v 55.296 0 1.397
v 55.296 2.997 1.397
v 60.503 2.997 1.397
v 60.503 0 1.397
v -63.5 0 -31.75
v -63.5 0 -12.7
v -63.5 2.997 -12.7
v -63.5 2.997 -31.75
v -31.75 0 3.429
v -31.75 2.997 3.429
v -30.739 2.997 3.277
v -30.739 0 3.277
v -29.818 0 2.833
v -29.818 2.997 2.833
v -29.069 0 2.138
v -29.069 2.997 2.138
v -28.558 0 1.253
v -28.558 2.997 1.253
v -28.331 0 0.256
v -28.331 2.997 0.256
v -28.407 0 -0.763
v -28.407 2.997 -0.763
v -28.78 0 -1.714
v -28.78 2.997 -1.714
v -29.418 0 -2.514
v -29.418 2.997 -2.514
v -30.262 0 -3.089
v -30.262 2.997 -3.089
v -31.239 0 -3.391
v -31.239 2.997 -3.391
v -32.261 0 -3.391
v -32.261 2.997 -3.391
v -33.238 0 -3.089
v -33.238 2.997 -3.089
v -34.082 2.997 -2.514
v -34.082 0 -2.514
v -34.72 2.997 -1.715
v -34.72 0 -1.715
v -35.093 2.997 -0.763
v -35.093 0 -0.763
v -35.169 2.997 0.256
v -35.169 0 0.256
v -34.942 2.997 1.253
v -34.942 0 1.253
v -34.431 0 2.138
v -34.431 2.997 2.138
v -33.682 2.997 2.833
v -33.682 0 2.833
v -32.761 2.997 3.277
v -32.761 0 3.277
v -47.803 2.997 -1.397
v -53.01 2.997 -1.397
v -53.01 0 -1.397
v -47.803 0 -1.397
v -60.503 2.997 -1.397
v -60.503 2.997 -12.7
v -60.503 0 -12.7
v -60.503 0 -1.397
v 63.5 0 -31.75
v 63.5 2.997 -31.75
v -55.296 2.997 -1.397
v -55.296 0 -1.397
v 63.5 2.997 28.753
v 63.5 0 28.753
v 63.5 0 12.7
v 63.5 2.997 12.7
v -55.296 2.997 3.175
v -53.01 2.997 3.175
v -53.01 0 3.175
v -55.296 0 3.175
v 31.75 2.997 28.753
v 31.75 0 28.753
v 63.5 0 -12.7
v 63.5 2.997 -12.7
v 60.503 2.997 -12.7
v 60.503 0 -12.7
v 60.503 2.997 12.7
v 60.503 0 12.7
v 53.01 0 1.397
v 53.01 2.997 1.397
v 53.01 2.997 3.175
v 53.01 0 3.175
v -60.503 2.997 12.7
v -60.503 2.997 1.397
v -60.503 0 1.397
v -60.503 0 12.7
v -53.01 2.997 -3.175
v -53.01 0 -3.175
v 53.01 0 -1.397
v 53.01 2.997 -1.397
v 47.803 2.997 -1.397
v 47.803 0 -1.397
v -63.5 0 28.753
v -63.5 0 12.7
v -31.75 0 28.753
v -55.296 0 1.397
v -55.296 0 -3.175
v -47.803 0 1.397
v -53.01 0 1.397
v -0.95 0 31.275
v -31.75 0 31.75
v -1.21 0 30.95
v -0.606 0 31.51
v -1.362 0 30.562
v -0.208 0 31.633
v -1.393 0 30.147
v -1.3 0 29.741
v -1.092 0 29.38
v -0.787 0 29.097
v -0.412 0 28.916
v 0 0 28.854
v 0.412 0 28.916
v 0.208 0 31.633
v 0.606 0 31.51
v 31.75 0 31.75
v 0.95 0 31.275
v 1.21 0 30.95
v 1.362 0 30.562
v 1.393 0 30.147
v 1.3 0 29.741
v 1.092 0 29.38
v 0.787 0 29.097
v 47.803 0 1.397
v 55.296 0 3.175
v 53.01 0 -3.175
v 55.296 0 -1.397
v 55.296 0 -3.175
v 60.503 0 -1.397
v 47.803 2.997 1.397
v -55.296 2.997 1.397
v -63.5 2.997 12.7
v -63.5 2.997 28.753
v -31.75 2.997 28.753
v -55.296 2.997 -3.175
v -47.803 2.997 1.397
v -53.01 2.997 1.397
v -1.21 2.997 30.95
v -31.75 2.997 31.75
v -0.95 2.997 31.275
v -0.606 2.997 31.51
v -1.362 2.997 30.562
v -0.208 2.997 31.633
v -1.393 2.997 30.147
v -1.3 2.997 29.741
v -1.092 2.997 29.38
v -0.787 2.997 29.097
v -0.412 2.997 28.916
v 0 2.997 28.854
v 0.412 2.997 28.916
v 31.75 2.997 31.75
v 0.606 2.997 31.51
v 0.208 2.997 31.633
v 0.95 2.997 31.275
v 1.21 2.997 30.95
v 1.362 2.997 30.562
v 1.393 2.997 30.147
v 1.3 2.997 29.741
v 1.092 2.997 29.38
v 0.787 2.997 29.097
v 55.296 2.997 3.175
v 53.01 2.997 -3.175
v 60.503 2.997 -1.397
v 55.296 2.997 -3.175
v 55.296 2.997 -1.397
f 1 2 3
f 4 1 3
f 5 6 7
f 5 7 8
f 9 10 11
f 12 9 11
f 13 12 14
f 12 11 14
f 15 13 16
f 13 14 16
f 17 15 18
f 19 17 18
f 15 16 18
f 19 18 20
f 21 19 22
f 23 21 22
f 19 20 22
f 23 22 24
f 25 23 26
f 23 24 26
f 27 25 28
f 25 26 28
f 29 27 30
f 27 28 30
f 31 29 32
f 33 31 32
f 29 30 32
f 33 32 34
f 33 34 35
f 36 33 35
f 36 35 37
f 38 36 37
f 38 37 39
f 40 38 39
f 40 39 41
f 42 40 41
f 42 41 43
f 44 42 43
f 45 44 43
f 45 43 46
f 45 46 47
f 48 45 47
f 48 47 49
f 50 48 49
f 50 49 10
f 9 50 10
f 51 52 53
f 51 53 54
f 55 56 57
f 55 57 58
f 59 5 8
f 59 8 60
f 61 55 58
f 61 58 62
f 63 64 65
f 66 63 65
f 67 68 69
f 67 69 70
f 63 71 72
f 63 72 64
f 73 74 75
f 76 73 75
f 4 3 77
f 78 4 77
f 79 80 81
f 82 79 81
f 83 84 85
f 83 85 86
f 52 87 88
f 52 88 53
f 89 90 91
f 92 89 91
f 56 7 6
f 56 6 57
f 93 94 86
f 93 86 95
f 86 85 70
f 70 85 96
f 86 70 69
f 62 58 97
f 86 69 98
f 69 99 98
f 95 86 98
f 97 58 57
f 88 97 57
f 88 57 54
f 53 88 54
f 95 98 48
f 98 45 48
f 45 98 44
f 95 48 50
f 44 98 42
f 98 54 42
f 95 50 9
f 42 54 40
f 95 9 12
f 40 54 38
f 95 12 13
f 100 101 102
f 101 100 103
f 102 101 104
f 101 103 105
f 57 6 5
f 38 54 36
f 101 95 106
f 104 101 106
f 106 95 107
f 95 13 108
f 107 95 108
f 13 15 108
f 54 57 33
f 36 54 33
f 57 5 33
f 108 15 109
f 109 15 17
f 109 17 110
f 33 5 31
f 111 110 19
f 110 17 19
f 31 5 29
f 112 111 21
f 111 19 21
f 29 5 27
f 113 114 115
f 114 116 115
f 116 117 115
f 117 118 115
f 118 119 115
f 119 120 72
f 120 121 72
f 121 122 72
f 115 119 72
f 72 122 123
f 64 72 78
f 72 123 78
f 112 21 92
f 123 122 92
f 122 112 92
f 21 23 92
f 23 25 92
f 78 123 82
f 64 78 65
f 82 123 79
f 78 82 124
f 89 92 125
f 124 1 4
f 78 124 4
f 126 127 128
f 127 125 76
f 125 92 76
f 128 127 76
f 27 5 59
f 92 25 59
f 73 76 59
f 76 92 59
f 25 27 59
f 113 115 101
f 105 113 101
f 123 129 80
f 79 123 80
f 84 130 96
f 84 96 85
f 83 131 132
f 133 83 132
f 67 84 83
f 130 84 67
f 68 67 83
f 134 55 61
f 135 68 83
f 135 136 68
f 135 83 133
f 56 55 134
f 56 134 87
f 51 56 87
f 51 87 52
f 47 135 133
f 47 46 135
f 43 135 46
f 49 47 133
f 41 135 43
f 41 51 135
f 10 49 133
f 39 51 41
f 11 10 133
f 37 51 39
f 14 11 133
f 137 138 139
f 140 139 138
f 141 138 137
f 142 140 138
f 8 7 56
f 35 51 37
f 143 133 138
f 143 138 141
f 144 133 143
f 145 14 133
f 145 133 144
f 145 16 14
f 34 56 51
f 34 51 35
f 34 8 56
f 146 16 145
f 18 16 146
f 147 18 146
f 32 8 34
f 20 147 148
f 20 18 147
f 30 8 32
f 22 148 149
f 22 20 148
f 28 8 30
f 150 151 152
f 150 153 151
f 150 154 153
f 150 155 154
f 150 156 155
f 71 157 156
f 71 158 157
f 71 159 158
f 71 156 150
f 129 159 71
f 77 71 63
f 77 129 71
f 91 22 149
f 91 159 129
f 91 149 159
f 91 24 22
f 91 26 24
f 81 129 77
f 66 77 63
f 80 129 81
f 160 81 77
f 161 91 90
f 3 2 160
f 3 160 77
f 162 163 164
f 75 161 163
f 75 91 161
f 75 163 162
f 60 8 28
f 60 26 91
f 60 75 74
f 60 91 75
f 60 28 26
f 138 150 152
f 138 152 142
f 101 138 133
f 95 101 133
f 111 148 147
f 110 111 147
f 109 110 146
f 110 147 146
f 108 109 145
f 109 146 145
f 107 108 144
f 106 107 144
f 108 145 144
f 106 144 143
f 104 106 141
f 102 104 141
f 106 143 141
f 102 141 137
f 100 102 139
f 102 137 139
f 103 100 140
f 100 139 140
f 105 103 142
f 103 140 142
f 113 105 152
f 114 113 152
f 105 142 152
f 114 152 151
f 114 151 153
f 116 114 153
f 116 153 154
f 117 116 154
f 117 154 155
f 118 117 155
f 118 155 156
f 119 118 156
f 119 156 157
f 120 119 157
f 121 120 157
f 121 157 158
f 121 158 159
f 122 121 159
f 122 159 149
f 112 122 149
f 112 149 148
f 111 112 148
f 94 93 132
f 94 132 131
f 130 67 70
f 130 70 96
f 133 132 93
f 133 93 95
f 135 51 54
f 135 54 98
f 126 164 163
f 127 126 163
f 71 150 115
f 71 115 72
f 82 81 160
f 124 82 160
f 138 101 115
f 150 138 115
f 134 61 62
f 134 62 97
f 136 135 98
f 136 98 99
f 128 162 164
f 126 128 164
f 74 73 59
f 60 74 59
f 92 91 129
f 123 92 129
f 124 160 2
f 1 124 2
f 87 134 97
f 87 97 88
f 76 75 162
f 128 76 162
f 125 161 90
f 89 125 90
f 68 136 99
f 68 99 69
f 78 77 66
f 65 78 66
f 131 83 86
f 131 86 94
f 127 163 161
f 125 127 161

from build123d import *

# Parameters (mm, degrees)
SKETCH1_W           = 127
SKETCH1_H           = 63.5
BOSS_EXTRUDE1_DEPTH = 2.9972
CUT_EXTRUDE1_REACH  = 73.058
SKETCH2_R           = 1.397
SKETCH2_W           = 31.75
SKETCH2_H           = 2.9972
CUT_EXTRUDE2_REACH  = 73.058
SKETCH3_R           = 3.429


with BuildPart() as part:
    # Sketch1 → Boss-Extrude1 (new body)
    with BuildSketch(Plane(origin=(0, 0, 0), x_dir=(1, 0, 0), z_dir=(0, 1, 0))):
        Rectangle(SKETCH1_W, SKETCH1_H)
    extrude(amount=BOSS_EXTRUDE1_DEPTH)

    # Sketch2 → Cut-Extrude1 (cut, up to next)
    with BuildSketch(Plane(origin=(0, 2.9972, 0), x_dir=(1, 0, 0), z_dir=(0, 1, 0)), mode=Mode.PRIVATE) as cut_extrude1_sk1:
        with Locations(Location((0, -30.2514, 0), (0, 0, 90))):
            Circle(SKETCH2_R)
    cut_extrude1_tool1 = extrude(cut_extrude1_sk1.sketch, amount=-CUT_EXTRUDE1_REACH, mode=Mode.PRIVATE) & part.part
    # Sketch2 → Cut-Extrude1 (cut, up to next)
    with BuildSketch(Plane(origin=(0, 2.9972, 0), x_dir=(1, 0, 0), z_dir=(0, 1, 0)), mode=Mode.PRIVATE) as cut_extrude1_sk2:
        with Locations((-47.625, -30.2514)):
            Rectangle(SKETCH2_W, SKETCH2_H)
    cut_extrude1_tool2 = extrude(cut_extrude1_sk2.sketch, amount=-CUT_EXTRUDE1_REACH, mode=Mode.PRIVATE) & part.part
    # Sketch2 → Cut-Extrude1 (cut, up to next)
    with BuildSketch(Plane(origin=(0, 2.9972, 0), x_dir=(1, 0, 0), z_dir=(0, 1, 0)), mode=Mode.PRIVATE) as cut_extrude1_sk3:
        Polygon((-63.5, 12.7), (-60.5028, 12.7), (-60.5028, 1.397), (-55.2958, 1.397), (-55.2958, 3.175), (-53.0098, 3.175), (-53.0098, 1.397), (-47.8028, 1.397), (-47.8028, -1.397), (-53.0098, -1.397), (-53.0098, -3.175), (-55.2958, -3.175), (-55.2958, -1.397), (-60.5028, -1.397), (-60.5028, -12.7), (-63.5, -12.7), align=None)
    cut_extrude1_tool3 = extrude(cut_extrude1_sk3.sketch, amount=-CUT_EXTRUDE1_REACH, mode=Mode.PRIVATE) & part.part
    # Sketch2 → Cut-Extrude1 (cut, up to next)
    with BuildSketch(Plane(origin=(0, 2.9972, 0), x_dir=(1, 0, 0), z_dir=(0, 1, 0)), mode=Mode.PRIVATE) as cut_extrude1_sk4:
        with Locations((47.625, -30.2514)):
            Rectangle(SKETCH2_W, SKETCH2_H)
    cut_extrude1_tool4 = extrude(cut_extrude1_sk4.sketch, amount=-CUT_EXTRUDE1_REACH, mode=Mode.PRIVATE) & part.part
    # Sketch2 → Cut-Extrude1 (cut, up to next)
    with BuildSketch(Plane(origin=(0, 2.9972, 0), x_dir=(1, 0, 0), z_dir=(0, 1, 0)), mode=Mode.PRIVATE) as cut_extrude1_sk5:
        Polygon((60.5028, -1.397), (60.5028, -12.7), (63.5, -12.7), (63.5, 12.7), (60.5028, 12.7), (60.5028, 1.397), (55.2958, 1.397), (55.2958, 3.175), (53.0098, 3.175), (53.0098, 1.397), (47.8028, 1.397), (47.8028, -1.397), (53.0098, -1.397), (53.0098, -3.175), (55.2958, -3.175), (55.2958, -1.397), align=None)
    cut_extrude1_tool5 = extrude(cut_extrude1_sk5.sketch, amount=-CUT_EXTRUDE1_REACH, mode=Mode.PRIVATE) & part.part
    add(cut_extrude1_tool1.solids().sort_by_distance((0, 2.9972, 30.2514))[0], mode=Mode.SUBTRACT)
    add(cut_extrude1_tool2.solids().sort_by_distance((-47.625, 2.9972, 30.2514))[0], mode=Mode.SUBTRACT)
    add(cut_extrude1_tool3.solids().sort_by_distance((-59.14275, 2.9972, 0))[0], mode=Mode.SUBTRACT)
    add(cut_extrude1_tool4.solids().sort_by_distance((47.625, 2.9972, 30.2514))[0], mode=Mode.SUBTRACT)
    add(cut_extrude1_tool5.solids().sort_by_distance((59.14275, 2.9972, 0))[0], mode=Mode.SUBTRACT)

    # Sketch3 → Cut-Extrude2 (cut, up to next)
    with BuildSketch(Plane(origin=(0, 2.9972, 0), x_dir=(1, 0, 0), z_dir=(0, 1, 0)), mode=Mode.PRIVATE) as cut_extrude2_sk1:
        with Locations(Location((-31.75, 0, 0), (0, 0, 270))):
            Circle(SKETCH3_R)
    cut_extrude2_tool1 = extrude(cut_extrude2_sk1.sketch, amount=-CUT_EXTRUDE2_REACH, mode=Mode.PRIVATE) & part.part
    add(cut_extrude2_tool1.solids().sort_by_distance((-31.75, 2.9972, 0))[0], mode=Mode.SUBTRACT)


solid = part.part
